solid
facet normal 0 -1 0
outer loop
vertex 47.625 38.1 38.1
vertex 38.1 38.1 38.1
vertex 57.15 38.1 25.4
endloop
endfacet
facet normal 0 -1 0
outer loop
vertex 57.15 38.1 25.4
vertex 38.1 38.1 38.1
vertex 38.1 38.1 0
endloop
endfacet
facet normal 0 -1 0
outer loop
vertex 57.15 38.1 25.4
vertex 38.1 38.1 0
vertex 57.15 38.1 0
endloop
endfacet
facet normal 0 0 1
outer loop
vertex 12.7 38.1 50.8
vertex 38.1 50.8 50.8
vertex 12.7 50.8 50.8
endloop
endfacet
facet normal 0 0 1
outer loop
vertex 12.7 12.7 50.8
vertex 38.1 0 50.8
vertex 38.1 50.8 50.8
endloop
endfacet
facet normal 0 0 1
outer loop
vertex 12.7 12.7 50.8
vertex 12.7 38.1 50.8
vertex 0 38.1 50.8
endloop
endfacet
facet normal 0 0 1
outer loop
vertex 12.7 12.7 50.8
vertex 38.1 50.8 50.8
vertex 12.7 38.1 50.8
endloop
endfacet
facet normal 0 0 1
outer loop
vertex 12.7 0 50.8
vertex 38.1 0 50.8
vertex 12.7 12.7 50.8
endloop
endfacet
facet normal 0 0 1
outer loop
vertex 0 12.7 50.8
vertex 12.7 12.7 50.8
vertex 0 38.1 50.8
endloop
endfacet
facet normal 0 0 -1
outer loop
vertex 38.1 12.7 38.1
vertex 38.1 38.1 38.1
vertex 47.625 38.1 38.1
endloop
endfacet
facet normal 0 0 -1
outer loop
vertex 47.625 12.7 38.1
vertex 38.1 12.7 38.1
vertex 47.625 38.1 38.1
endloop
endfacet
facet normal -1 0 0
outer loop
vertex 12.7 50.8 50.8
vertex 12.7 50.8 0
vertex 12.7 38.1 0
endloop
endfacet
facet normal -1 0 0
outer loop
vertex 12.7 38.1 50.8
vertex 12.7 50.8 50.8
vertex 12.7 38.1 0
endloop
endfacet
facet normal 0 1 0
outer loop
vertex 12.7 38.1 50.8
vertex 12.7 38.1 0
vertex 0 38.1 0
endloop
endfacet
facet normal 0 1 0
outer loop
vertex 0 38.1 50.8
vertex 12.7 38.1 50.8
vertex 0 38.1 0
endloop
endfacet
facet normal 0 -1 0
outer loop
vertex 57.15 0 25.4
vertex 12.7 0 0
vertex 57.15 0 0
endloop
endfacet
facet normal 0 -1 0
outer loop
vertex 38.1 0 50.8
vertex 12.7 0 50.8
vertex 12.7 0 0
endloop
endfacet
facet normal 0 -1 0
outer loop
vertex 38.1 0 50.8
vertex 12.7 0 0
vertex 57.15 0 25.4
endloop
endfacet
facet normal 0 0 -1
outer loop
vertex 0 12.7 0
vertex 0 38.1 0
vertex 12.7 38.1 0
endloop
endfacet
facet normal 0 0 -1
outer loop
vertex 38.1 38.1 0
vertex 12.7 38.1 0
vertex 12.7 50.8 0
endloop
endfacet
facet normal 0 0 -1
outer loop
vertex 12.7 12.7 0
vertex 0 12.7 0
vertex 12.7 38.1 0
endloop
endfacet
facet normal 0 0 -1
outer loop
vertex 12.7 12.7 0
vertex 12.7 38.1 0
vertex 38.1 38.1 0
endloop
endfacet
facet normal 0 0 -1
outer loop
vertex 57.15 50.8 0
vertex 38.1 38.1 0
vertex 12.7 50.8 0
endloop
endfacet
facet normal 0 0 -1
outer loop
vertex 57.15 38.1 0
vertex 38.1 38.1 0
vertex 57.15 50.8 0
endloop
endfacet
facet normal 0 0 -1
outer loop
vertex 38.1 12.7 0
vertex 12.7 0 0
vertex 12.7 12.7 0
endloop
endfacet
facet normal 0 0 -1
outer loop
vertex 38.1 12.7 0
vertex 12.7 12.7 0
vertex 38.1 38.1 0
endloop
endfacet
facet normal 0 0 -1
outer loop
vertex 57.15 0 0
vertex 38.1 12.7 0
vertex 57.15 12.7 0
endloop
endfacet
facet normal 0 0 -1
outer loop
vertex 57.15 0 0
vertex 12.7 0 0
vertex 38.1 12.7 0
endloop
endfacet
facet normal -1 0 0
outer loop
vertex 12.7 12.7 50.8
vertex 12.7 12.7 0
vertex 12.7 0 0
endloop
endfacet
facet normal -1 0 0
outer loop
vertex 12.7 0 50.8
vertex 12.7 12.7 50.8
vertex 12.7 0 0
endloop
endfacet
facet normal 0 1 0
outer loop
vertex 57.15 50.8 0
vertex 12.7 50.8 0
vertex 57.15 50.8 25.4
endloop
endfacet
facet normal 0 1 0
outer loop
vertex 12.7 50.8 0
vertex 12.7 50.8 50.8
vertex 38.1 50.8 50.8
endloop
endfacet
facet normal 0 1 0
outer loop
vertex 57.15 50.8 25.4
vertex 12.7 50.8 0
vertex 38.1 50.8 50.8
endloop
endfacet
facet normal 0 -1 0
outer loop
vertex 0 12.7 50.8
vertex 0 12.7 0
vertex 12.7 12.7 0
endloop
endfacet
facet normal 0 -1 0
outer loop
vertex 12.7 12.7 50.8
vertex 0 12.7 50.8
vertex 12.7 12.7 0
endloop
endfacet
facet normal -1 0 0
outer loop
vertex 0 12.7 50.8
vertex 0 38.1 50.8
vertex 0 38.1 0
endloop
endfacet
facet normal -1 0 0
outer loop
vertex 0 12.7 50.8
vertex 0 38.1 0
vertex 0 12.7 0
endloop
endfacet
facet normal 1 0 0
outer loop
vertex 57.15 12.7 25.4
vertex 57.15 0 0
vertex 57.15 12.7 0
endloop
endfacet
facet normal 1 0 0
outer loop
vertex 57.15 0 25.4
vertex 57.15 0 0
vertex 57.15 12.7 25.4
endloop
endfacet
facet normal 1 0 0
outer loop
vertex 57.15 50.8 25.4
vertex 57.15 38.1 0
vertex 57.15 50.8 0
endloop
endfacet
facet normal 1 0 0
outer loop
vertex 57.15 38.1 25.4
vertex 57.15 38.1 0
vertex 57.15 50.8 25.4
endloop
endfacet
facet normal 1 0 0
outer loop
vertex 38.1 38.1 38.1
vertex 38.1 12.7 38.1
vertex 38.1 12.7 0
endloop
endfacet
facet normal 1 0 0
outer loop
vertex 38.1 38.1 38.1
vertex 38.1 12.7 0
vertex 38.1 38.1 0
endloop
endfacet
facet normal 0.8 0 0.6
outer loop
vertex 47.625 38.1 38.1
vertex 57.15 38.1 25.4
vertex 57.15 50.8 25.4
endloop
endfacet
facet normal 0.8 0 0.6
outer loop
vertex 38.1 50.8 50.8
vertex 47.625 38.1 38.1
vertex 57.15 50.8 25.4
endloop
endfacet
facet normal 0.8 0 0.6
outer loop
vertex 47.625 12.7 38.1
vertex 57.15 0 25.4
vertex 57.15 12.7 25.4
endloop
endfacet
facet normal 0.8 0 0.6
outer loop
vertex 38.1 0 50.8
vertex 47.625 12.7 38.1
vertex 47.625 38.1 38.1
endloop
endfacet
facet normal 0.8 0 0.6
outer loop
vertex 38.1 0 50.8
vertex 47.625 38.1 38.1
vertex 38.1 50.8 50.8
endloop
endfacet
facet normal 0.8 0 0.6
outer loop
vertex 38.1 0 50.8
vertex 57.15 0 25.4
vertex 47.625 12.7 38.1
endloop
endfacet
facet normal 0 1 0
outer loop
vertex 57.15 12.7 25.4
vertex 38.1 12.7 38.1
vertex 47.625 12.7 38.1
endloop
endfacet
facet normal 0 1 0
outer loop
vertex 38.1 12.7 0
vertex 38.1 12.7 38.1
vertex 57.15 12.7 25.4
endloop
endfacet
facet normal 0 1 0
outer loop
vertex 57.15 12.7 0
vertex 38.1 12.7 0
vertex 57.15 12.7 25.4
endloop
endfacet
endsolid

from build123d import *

# Parameters (mm, degrees)
F1_DEPTH = 50.8
F3_DEPTH = 50.8
F4_W     = 19.05
F4_H     = 25.4
F5_DEPTH = 38.1


with BuildPart() as f1:
    # F0 (on Top) → F1 (new body)
    with BuildSketch(Plane.XY):
        Polygon((12.7, 12.7), (12.7, 0), (25.4, 0), (25.4, 50.8), (12.7, 50.8), (12.7, 38.1), (0, 38.1), (0, 12.7), align=None)
    extrude(amount=F1_DEPTH)

    # F2 (on Front) → F3 (join)
    with BuildSketch(Plane.XZ):
        Polygon((25.4, 50.8), (25.4, 0), (57.15, 0), (57.15, 25.4), (38.1, 50.8), align=None)
    extrude(amount=-F3_DEPTH)

    # F4 (on Top) → F5 (cut)
    with BuildSketch(Plane.XY):
        with Locations((47.625, 25.4)):
            Rectangle(F4_W, F4_H)
    extrude(amount=F5_DEPTH, mode=Mode.SUBTRACT)


solid = f1.part
